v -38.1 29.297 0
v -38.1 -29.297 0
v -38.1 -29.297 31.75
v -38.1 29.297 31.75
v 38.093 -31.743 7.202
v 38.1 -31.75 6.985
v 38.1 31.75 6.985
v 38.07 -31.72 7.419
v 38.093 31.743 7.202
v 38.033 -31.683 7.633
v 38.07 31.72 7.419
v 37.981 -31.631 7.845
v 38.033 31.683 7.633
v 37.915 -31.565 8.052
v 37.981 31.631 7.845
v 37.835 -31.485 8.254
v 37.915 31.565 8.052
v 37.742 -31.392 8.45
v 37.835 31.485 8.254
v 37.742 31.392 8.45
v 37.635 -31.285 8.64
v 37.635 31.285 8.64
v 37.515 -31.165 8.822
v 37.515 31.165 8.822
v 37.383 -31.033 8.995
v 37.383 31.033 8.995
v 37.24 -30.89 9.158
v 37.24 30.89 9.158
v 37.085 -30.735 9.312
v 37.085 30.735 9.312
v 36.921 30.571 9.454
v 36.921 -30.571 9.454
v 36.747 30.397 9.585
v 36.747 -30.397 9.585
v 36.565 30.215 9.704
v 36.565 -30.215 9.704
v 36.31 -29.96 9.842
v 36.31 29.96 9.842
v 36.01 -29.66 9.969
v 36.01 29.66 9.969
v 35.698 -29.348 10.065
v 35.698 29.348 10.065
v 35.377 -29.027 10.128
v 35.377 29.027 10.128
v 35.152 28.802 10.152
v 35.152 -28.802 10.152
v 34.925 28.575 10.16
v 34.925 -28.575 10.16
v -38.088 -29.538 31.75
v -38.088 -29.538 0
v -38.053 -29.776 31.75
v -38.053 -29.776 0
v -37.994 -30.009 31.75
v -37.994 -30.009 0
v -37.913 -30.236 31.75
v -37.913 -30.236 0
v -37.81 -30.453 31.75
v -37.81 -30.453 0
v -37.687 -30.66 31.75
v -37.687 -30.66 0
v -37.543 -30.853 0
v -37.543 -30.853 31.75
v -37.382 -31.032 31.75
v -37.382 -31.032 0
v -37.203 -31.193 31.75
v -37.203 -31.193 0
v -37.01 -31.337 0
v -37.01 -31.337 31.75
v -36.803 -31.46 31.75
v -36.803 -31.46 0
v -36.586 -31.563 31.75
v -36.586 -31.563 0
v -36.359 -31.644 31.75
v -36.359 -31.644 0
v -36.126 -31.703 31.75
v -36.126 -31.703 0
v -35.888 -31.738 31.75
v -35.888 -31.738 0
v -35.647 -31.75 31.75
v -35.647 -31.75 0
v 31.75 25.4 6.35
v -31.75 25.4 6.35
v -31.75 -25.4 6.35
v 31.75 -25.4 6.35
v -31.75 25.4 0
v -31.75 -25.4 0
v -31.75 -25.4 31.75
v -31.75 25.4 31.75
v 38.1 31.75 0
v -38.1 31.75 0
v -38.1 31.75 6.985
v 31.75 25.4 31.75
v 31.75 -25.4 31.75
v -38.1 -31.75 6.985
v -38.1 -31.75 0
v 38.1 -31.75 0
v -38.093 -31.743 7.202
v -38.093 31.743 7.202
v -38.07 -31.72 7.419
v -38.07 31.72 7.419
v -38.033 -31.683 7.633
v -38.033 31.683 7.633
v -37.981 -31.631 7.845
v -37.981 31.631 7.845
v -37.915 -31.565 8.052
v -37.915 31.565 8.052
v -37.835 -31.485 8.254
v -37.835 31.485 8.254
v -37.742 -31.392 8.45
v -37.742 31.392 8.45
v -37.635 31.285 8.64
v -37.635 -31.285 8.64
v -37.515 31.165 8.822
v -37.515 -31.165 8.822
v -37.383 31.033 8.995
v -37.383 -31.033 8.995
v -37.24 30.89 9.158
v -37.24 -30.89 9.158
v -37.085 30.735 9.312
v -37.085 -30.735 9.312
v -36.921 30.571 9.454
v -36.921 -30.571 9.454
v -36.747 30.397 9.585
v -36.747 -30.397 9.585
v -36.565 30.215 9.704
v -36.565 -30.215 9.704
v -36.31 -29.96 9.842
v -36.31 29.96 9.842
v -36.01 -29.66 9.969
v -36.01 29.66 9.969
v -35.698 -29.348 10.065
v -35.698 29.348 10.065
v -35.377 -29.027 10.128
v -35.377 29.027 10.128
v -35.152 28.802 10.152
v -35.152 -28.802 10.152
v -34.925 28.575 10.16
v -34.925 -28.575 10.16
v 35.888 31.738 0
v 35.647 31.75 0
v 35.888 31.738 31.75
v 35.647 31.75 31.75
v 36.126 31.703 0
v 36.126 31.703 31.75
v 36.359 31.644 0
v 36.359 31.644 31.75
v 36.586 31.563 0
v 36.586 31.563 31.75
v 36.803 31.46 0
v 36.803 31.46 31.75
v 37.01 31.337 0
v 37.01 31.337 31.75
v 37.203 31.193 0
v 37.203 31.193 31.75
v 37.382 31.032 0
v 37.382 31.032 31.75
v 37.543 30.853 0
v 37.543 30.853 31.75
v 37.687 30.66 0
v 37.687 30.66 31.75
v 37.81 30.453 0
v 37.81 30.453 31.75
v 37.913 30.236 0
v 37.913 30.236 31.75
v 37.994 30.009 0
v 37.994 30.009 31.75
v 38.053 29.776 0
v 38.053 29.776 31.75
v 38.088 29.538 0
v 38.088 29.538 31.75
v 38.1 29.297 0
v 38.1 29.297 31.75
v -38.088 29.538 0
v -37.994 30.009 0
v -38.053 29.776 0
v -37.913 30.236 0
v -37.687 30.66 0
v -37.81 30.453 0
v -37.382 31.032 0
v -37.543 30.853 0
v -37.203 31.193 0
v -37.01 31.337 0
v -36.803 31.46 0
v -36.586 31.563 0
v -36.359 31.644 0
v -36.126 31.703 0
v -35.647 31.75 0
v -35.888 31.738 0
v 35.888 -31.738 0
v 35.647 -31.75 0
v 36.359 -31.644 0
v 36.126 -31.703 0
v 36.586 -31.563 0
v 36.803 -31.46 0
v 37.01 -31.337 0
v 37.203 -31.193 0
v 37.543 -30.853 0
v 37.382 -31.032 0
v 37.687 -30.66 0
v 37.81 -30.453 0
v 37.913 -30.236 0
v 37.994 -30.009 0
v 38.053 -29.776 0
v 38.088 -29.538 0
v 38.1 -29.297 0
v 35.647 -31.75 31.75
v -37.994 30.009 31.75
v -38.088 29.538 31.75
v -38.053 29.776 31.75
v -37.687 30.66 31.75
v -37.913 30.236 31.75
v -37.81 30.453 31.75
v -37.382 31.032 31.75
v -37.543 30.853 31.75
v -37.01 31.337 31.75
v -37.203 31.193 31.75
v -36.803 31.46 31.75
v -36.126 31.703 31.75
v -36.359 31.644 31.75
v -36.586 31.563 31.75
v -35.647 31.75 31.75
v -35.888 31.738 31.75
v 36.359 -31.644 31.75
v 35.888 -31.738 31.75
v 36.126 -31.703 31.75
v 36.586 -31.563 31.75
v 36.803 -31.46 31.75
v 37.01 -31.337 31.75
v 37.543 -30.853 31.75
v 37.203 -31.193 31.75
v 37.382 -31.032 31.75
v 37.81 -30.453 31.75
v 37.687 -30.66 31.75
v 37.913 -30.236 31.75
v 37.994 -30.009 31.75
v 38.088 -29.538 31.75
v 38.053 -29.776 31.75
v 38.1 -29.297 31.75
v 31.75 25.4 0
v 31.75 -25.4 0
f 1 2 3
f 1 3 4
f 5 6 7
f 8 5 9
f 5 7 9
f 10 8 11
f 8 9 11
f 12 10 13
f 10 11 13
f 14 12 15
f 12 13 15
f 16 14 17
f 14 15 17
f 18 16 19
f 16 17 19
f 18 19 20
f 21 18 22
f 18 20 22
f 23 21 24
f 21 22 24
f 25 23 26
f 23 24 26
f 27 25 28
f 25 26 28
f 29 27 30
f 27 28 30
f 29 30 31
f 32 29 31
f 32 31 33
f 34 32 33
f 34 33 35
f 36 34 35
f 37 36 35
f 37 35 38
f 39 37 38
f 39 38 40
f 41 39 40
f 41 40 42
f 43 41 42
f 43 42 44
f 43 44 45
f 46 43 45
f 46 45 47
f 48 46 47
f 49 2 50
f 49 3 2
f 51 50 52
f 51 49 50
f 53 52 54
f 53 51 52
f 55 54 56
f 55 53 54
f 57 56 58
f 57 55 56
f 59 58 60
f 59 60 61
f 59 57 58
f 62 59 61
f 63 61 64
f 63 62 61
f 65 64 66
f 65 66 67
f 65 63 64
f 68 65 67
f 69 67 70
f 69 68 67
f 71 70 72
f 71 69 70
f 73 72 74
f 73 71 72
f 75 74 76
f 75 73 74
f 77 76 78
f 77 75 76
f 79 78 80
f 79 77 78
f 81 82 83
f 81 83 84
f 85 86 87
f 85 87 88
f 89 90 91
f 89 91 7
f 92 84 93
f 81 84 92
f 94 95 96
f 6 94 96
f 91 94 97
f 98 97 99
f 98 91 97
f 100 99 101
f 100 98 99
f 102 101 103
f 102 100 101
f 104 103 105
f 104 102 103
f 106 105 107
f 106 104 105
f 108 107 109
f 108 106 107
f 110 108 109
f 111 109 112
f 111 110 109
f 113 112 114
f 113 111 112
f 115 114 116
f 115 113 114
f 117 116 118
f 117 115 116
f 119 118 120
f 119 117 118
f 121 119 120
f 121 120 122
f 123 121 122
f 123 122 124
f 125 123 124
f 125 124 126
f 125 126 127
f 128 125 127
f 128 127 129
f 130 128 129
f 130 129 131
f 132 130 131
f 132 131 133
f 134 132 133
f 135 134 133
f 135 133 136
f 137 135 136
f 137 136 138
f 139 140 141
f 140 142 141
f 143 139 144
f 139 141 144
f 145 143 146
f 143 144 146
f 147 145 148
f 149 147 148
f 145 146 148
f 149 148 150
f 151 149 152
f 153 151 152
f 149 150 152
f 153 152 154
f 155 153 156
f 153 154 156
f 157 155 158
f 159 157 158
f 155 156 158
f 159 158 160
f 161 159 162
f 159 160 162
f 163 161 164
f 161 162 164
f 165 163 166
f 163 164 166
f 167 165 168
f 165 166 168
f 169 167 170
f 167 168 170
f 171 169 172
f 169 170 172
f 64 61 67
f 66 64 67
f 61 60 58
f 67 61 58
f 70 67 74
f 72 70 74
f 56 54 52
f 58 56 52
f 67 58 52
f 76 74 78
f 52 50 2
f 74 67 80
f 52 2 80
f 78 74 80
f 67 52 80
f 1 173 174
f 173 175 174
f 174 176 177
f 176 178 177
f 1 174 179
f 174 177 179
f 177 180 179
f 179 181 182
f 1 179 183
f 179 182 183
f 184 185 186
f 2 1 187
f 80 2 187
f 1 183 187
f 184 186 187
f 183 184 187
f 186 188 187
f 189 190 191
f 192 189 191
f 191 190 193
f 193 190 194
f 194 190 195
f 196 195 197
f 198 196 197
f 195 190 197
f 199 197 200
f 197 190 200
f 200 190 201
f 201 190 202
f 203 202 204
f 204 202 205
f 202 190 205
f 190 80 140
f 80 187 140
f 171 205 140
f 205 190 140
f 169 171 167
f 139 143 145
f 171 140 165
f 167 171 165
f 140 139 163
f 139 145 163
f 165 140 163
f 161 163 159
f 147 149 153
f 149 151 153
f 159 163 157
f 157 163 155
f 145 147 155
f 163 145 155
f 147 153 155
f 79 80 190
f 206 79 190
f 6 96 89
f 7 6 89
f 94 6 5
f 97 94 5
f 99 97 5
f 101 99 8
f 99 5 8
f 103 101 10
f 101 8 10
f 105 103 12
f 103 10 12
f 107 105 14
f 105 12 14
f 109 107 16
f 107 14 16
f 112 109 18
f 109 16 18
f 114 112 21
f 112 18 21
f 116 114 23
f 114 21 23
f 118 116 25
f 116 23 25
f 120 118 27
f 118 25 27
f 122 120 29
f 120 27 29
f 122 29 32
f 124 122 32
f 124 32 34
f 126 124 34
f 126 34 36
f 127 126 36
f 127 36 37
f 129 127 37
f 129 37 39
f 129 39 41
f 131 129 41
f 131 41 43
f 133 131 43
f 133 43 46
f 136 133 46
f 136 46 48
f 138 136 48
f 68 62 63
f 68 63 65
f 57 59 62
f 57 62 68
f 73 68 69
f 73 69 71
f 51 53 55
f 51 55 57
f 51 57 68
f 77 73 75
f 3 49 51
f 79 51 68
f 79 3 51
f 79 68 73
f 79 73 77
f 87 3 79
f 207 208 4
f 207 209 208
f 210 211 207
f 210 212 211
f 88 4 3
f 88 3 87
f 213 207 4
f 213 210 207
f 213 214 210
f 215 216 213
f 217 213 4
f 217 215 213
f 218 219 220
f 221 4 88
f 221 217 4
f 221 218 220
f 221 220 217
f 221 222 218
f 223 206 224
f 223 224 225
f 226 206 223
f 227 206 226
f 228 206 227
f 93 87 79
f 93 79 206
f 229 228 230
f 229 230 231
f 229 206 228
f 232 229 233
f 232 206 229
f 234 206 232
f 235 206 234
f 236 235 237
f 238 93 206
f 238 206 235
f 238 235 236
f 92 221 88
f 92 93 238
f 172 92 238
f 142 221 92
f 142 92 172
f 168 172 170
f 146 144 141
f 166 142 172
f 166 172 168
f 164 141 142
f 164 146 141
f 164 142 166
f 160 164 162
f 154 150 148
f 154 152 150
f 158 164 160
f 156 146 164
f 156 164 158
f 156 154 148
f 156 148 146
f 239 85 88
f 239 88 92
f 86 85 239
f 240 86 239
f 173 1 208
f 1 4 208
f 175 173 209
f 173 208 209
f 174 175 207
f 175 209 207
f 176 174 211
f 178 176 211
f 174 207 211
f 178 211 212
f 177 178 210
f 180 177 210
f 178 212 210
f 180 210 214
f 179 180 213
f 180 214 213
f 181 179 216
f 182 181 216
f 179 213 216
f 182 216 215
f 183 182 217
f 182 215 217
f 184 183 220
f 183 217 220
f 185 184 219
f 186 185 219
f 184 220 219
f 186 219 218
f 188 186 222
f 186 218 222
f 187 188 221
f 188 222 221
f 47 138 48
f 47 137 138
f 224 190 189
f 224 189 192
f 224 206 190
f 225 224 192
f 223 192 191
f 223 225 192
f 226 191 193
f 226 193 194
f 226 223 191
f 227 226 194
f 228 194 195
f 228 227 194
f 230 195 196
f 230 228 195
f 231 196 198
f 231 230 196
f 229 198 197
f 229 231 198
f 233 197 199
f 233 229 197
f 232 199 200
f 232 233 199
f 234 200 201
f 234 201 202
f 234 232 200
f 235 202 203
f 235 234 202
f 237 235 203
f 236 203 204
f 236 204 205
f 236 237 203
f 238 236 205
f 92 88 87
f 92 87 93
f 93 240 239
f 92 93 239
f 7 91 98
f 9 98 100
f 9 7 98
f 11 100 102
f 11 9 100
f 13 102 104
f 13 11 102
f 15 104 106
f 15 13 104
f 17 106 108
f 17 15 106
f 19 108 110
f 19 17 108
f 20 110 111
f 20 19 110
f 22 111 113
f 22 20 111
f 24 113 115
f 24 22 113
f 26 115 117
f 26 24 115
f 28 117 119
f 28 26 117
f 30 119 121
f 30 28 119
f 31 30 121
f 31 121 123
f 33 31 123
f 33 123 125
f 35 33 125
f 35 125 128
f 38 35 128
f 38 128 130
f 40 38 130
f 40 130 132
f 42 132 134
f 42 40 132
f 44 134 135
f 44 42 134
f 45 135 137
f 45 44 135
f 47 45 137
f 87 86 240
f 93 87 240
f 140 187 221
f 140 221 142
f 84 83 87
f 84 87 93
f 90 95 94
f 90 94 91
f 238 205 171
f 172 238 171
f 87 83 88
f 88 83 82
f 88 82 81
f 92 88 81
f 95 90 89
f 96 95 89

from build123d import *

# Parameters (mm, degrees)
F0_W     = 76.2
F0_H     = 63.5
F0_W_2   = 63.5
F0_H_2   = 50.8
F1_DEPTH = 31.75
F2_DEPTH = 6.35
F3_R     = 2.452841
F4_DEPTH = 10.16
F5_R     = 3.175
F6_DEPTH = 31.75


with BuildPart() as f1:
    # F0 (on Top) → F1 (new body)
    with BuildSketch(Plane.XY):
        Rectangle(F0_W, F0_H)
        Rectangle(F0_W_2, F0_H_2, mode=Mode.SUBTRACT)
    extrude(amount=F1_DEPTH)

    # F0 (on Top) → F2 (join)
    with BuildSketch(Plane.XY):
        Rectangle(F0_W_2, F0_H_2)
    extrude(amount=F2_DEPTH)

    # F3
    f3_edges = [f1.edges().sort_by_distance(p)[0] for p in [
        (-38.1, 31.75, 15.875),
        (38.1, 31.75, 15.875),
        (38.1, -31.75, 15.875),
        (-38.1, -31.75, 15.875),
    ]]
    fillet(f3_edges, radius=F3_R)


with BuildPart() as f4:
    # F0 (on Top) → F4 (new body)
    with BuildSketch(Plane.XY):
        Rectangle(F0_W, F0_H)
        Rectangle(F0_W_2, F0_H_2, mode=Mode.SUBTRACT)
        Rectangle(F0_W_2, F0_H_2)
    extrude(amount=F4_DEPTH)

    # F5
    f5_edges = [f4.edges().sort_by_distance(p)[0] for p in [
        (0, -31.75, 10.16),
        (-38.1, 0, 10.16),
        (38.1, 0, 10.16),
        (0, 31.75, 10.16),
    ]]
    fillet(f5_edges, radius=F5_R)


with BuildPart() as f6:
    # F0 (on Top) → F6 (new body)
    with BuildSketch(Plane.XY):
        Rectangle(F0_W_2, F0_H_2)
    extrude(amount=F6_DEPTH)


solid = Compound([f1.part, f4.part, f6.part])
